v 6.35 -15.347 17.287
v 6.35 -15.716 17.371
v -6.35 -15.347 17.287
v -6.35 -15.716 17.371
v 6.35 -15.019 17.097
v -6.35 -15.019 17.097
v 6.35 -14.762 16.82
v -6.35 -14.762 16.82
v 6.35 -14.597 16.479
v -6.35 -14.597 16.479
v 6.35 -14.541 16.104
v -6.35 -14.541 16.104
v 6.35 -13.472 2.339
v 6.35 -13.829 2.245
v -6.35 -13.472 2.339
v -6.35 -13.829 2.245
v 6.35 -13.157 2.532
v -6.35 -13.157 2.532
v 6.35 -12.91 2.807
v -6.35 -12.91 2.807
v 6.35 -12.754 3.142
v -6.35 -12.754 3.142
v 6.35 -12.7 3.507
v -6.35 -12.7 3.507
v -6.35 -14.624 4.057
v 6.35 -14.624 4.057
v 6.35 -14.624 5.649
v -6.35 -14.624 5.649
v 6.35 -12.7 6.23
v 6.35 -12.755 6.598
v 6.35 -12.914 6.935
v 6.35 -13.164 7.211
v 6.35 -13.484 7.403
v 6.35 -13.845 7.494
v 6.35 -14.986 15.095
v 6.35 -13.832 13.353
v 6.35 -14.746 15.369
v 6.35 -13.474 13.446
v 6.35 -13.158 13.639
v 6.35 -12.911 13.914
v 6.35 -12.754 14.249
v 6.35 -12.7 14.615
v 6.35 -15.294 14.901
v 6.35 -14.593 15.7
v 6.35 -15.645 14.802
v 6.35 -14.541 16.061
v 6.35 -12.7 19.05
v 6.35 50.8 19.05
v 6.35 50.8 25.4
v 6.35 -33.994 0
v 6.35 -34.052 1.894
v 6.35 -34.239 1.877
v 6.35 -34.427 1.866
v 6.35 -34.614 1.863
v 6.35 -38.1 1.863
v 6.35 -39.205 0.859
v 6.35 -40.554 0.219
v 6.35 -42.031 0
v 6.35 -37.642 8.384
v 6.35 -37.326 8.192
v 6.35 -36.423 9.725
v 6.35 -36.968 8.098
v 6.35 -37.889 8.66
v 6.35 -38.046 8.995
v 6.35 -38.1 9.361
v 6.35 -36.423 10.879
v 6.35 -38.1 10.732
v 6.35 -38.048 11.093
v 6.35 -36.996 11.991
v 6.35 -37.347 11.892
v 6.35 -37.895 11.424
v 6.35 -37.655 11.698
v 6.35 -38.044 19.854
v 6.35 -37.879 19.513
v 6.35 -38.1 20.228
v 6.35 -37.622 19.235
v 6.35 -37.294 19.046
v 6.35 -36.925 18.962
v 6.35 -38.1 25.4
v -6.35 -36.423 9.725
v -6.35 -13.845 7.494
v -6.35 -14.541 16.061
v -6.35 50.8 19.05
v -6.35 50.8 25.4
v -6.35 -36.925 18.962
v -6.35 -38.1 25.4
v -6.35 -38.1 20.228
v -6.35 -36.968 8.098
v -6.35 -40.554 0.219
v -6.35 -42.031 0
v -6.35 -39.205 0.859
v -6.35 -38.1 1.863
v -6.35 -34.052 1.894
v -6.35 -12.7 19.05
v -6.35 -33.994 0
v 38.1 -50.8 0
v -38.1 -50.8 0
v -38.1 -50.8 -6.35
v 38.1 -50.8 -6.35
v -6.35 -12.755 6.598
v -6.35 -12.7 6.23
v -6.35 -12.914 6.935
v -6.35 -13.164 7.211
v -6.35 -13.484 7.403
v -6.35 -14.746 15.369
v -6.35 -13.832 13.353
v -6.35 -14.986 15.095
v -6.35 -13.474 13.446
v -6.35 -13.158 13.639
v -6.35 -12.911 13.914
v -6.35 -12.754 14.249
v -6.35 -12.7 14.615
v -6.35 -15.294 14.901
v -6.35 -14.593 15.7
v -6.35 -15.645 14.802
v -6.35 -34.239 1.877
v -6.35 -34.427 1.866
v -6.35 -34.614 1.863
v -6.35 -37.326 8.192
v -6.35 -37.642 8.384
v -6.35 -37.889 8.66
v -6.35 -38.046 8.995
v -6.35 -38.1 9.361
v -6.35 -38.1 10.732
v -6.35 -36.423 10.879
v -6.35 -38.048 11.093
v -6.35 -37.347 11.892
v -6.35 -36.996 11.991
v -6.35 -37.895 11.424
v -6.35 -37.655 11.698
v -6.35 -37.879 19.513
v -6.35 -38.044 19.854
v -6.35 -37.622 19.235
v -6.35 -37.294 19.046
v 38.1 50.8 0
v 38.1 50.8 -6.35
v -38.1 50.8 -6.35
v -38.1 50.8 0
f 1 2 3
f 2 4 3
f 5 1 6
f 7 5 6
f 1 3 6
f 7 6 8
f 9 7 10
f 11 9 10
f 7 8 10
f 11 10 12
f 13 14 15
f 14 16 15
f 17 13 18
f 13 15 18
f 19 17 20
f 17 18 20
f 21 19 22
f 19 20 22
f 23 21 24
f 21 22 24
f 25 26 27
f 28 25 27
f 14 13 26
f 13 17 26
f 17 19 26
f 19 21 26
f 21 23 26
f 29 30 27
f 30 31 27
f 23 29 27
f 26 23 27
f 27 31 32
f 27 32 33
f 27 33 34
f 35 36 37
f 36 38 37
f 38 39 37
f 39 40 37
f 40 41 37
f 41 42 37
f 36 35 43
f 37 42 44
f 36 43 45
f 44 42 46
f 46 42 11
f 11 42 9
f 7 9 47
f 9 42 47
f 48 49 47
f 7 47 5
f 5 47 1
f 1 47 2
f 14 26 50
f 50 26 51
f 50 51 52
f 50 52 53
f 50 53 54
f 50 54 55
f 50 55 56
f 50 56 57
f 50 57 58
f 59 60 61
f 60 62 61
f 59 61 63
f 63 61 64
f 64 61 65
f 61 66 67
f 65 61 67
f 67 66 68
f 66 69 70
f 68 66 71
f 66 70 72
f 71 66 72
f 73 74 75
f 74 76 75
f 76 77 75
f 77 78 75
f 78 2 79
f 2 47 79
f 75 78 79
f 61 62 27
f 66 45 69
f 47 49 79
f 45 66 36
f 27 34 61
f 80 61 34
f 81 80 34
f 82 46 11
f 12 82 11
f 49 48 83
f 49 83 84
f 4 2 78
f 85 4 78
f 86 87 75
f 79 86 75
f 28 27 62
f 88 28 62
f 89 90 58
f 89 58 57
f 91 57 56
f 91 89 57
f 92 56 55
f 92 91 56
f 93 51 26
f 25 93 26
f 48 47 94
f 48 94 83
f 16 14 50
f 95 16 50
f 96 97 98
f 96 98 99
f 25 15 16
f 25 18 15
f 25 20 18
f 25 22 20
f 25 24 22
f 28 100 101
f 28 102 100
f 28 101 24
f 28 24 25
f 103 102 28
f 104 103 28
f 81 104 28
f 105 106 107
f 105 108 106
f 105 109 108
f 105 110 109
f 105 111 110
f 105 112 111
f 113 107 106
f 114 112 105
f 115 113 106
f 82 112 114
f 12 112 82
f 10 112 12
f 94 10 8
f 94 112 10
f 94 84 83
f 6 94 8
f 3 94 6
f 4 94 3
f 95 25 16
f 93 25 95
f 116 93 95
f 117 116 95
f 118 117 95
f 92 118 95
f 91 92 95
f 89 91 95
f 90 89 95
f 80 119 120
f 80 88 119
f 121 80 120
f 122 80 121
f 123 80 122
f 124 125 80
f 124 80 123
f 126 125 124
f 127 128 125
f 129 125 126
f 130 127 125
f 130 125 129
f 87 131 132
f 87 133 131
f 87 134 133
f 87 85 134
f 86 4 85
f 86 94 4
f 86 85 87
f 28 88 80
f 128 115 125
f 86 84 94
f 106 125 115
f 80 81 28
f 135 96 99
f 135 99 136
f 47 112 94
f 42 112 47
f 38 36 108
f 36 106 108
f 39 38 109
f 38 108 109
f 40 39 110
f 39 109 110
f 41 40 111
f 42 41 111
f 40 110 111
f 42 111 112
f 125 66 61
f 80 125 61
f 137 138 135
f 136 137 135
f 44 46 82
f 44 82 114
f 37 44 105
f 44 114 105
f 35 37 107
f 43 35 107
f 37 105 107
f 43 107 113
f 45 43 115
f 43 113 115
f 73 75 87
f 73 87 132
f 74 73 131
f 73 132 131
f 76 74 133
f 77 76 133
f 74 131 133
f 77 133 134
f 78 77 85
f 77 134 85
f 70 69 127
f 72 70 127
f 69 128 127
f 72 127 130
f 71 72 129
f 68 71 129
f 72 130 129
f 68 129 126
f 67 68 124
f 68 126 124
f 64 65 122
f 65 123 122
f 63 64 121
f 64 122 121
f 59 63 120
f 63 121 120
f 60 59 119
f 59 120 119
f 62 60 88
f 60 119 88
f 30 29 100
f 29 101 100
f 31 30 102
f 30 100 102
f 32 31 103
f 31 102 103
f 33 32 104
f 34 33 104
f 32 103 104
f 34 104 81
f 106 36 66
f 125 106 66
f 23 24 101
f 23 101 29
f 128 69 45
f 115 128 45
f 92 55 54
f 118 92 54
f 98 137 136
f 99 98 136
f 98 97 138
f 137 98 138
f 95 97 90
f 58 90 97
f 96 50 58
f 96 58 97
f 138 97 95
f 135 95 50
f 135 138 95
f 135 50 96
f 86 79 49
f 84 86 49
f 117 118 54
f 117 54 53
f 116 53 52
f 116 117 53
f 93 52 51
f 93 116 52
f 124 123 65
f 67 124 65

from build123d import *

# Parameters (mm, degrees)
F0_W        = 76.2
F0_H        = 101.6
F1_DEPTH    = 6.35
F2_W        = 12.7
F2_H        = 25.4
F3_DEPTH    = 25.4
F4_W        = 63.5
F4_H        = 6.35
F5_DEPTH    = 12.7
F7_DEPTH    = 12.7
F8_T1_DEPTH = 12.7
F9_R        = 1.27


# Not quite as in the source:
# - a fillet or chamfer that OpenCascade refuses, or shapes differently, is made with other operations: its cross-section is extruded or revolved along the edge and cut away or added


with BuildPart() as f1:
    # F0 (on Top) → F1 (new body)
    with BuildSketch(Plane.XY):
        Rectangle(F0_W, F0_H)
    extrude(amount=-F1_DEPTH)

    # F2 (on face) → F3 (join)
    with BuildSketch(Plane.XY):
        with Locations((0, -25.4)):
            Rectangle(F2_W, F2_H)
    extrude(amount=F3_DEPTH)

    # F4 (on face) → F5 (join, through all)
    with BuildSketch(Plane.YZ.offset(6.35)):
        with Locations((19.05, 22.225)):
            Rectangle(F4_W, F4_H)
    extrude(amount=-F5_DEPTH)

    # F6 (on face) → F7 (cut, through all)
    with BuildSketch(Plane.YZ.offset(6.35)):
        Polygon((-12.7, 2.3706669454), (-33.9936651289, 0), (-12.7, 0), align=None)
        Polygon((-38.1, 1.8626668025), (-34.33233127, 1.8626668025), (-14.6236953676, 4.0568692279), (-14.6236953676, 5.64925652), (-38.1, 8.2224374637), align=None)
        Polygon((-36.4234596491, 9.7253257409), (-12.7, 7.3805158027), (-12.7, 13.4764490649), (-36.4234596491, 10.8793787658), align=None)
        Polygon((-38.1, 19.05), (-38.1, 11.84564922), (-14.5409666002, 14.9470388849), (-14.5409666002, 17.2827038914), align=None)
    extrude(amount=-F7_DEPTH, mode=Mode.SUBTRACT)

    # F8: fillet of radius 5.08 on 2 edges, made by hand

    # F8_s2 → F8_t1 (join)
    with BuildSketch(Plane.YZ.offset(-6.35)):
        with BuildLine():
            ThreePointArc((-42.0313060293, 0), (-39.8561799, 0.4892237779), (-38.1, 1.8626668025))
            Line((-38.1, 1.8626668025), (-38.1, 0))
            Line((-38.1, 0), (-42.0313060293, 0))
        make_face()
        with BuildLine():
            ThreePointArc((-34.6142437504, 1.8626668025), (-34.3327643656, 1.870471089), (-34.0521498413, 1.8938599694))
            Line((-34.0521498413, 1.8938599694), (-34.33233127, 1.8626668025))
            Line((-34.33233127, 1.8626668025), (-34.6142437504, 1.8626668025))
        make_face()
    extrude(amount=F8_T1_DEPTH)

    # F9
    f9_edges = [f1.edges().sort_by_distance(p)[0] for p in [
        (0, -12.7, 7.380516),
        (0, -12.7, 2.370667),
        (0, -38.1, 11.845649),
        (0, -38.1, 8.222437),
        (0, -12.7, 13.476449),
        (0, -38.1, 19.05),
        (0, -14.540967, 17.282704),
        (0, -14.540967, 14.947039),
    ]]
    fillet(f9_edges, radius=F9_R)


solid = f1.part
